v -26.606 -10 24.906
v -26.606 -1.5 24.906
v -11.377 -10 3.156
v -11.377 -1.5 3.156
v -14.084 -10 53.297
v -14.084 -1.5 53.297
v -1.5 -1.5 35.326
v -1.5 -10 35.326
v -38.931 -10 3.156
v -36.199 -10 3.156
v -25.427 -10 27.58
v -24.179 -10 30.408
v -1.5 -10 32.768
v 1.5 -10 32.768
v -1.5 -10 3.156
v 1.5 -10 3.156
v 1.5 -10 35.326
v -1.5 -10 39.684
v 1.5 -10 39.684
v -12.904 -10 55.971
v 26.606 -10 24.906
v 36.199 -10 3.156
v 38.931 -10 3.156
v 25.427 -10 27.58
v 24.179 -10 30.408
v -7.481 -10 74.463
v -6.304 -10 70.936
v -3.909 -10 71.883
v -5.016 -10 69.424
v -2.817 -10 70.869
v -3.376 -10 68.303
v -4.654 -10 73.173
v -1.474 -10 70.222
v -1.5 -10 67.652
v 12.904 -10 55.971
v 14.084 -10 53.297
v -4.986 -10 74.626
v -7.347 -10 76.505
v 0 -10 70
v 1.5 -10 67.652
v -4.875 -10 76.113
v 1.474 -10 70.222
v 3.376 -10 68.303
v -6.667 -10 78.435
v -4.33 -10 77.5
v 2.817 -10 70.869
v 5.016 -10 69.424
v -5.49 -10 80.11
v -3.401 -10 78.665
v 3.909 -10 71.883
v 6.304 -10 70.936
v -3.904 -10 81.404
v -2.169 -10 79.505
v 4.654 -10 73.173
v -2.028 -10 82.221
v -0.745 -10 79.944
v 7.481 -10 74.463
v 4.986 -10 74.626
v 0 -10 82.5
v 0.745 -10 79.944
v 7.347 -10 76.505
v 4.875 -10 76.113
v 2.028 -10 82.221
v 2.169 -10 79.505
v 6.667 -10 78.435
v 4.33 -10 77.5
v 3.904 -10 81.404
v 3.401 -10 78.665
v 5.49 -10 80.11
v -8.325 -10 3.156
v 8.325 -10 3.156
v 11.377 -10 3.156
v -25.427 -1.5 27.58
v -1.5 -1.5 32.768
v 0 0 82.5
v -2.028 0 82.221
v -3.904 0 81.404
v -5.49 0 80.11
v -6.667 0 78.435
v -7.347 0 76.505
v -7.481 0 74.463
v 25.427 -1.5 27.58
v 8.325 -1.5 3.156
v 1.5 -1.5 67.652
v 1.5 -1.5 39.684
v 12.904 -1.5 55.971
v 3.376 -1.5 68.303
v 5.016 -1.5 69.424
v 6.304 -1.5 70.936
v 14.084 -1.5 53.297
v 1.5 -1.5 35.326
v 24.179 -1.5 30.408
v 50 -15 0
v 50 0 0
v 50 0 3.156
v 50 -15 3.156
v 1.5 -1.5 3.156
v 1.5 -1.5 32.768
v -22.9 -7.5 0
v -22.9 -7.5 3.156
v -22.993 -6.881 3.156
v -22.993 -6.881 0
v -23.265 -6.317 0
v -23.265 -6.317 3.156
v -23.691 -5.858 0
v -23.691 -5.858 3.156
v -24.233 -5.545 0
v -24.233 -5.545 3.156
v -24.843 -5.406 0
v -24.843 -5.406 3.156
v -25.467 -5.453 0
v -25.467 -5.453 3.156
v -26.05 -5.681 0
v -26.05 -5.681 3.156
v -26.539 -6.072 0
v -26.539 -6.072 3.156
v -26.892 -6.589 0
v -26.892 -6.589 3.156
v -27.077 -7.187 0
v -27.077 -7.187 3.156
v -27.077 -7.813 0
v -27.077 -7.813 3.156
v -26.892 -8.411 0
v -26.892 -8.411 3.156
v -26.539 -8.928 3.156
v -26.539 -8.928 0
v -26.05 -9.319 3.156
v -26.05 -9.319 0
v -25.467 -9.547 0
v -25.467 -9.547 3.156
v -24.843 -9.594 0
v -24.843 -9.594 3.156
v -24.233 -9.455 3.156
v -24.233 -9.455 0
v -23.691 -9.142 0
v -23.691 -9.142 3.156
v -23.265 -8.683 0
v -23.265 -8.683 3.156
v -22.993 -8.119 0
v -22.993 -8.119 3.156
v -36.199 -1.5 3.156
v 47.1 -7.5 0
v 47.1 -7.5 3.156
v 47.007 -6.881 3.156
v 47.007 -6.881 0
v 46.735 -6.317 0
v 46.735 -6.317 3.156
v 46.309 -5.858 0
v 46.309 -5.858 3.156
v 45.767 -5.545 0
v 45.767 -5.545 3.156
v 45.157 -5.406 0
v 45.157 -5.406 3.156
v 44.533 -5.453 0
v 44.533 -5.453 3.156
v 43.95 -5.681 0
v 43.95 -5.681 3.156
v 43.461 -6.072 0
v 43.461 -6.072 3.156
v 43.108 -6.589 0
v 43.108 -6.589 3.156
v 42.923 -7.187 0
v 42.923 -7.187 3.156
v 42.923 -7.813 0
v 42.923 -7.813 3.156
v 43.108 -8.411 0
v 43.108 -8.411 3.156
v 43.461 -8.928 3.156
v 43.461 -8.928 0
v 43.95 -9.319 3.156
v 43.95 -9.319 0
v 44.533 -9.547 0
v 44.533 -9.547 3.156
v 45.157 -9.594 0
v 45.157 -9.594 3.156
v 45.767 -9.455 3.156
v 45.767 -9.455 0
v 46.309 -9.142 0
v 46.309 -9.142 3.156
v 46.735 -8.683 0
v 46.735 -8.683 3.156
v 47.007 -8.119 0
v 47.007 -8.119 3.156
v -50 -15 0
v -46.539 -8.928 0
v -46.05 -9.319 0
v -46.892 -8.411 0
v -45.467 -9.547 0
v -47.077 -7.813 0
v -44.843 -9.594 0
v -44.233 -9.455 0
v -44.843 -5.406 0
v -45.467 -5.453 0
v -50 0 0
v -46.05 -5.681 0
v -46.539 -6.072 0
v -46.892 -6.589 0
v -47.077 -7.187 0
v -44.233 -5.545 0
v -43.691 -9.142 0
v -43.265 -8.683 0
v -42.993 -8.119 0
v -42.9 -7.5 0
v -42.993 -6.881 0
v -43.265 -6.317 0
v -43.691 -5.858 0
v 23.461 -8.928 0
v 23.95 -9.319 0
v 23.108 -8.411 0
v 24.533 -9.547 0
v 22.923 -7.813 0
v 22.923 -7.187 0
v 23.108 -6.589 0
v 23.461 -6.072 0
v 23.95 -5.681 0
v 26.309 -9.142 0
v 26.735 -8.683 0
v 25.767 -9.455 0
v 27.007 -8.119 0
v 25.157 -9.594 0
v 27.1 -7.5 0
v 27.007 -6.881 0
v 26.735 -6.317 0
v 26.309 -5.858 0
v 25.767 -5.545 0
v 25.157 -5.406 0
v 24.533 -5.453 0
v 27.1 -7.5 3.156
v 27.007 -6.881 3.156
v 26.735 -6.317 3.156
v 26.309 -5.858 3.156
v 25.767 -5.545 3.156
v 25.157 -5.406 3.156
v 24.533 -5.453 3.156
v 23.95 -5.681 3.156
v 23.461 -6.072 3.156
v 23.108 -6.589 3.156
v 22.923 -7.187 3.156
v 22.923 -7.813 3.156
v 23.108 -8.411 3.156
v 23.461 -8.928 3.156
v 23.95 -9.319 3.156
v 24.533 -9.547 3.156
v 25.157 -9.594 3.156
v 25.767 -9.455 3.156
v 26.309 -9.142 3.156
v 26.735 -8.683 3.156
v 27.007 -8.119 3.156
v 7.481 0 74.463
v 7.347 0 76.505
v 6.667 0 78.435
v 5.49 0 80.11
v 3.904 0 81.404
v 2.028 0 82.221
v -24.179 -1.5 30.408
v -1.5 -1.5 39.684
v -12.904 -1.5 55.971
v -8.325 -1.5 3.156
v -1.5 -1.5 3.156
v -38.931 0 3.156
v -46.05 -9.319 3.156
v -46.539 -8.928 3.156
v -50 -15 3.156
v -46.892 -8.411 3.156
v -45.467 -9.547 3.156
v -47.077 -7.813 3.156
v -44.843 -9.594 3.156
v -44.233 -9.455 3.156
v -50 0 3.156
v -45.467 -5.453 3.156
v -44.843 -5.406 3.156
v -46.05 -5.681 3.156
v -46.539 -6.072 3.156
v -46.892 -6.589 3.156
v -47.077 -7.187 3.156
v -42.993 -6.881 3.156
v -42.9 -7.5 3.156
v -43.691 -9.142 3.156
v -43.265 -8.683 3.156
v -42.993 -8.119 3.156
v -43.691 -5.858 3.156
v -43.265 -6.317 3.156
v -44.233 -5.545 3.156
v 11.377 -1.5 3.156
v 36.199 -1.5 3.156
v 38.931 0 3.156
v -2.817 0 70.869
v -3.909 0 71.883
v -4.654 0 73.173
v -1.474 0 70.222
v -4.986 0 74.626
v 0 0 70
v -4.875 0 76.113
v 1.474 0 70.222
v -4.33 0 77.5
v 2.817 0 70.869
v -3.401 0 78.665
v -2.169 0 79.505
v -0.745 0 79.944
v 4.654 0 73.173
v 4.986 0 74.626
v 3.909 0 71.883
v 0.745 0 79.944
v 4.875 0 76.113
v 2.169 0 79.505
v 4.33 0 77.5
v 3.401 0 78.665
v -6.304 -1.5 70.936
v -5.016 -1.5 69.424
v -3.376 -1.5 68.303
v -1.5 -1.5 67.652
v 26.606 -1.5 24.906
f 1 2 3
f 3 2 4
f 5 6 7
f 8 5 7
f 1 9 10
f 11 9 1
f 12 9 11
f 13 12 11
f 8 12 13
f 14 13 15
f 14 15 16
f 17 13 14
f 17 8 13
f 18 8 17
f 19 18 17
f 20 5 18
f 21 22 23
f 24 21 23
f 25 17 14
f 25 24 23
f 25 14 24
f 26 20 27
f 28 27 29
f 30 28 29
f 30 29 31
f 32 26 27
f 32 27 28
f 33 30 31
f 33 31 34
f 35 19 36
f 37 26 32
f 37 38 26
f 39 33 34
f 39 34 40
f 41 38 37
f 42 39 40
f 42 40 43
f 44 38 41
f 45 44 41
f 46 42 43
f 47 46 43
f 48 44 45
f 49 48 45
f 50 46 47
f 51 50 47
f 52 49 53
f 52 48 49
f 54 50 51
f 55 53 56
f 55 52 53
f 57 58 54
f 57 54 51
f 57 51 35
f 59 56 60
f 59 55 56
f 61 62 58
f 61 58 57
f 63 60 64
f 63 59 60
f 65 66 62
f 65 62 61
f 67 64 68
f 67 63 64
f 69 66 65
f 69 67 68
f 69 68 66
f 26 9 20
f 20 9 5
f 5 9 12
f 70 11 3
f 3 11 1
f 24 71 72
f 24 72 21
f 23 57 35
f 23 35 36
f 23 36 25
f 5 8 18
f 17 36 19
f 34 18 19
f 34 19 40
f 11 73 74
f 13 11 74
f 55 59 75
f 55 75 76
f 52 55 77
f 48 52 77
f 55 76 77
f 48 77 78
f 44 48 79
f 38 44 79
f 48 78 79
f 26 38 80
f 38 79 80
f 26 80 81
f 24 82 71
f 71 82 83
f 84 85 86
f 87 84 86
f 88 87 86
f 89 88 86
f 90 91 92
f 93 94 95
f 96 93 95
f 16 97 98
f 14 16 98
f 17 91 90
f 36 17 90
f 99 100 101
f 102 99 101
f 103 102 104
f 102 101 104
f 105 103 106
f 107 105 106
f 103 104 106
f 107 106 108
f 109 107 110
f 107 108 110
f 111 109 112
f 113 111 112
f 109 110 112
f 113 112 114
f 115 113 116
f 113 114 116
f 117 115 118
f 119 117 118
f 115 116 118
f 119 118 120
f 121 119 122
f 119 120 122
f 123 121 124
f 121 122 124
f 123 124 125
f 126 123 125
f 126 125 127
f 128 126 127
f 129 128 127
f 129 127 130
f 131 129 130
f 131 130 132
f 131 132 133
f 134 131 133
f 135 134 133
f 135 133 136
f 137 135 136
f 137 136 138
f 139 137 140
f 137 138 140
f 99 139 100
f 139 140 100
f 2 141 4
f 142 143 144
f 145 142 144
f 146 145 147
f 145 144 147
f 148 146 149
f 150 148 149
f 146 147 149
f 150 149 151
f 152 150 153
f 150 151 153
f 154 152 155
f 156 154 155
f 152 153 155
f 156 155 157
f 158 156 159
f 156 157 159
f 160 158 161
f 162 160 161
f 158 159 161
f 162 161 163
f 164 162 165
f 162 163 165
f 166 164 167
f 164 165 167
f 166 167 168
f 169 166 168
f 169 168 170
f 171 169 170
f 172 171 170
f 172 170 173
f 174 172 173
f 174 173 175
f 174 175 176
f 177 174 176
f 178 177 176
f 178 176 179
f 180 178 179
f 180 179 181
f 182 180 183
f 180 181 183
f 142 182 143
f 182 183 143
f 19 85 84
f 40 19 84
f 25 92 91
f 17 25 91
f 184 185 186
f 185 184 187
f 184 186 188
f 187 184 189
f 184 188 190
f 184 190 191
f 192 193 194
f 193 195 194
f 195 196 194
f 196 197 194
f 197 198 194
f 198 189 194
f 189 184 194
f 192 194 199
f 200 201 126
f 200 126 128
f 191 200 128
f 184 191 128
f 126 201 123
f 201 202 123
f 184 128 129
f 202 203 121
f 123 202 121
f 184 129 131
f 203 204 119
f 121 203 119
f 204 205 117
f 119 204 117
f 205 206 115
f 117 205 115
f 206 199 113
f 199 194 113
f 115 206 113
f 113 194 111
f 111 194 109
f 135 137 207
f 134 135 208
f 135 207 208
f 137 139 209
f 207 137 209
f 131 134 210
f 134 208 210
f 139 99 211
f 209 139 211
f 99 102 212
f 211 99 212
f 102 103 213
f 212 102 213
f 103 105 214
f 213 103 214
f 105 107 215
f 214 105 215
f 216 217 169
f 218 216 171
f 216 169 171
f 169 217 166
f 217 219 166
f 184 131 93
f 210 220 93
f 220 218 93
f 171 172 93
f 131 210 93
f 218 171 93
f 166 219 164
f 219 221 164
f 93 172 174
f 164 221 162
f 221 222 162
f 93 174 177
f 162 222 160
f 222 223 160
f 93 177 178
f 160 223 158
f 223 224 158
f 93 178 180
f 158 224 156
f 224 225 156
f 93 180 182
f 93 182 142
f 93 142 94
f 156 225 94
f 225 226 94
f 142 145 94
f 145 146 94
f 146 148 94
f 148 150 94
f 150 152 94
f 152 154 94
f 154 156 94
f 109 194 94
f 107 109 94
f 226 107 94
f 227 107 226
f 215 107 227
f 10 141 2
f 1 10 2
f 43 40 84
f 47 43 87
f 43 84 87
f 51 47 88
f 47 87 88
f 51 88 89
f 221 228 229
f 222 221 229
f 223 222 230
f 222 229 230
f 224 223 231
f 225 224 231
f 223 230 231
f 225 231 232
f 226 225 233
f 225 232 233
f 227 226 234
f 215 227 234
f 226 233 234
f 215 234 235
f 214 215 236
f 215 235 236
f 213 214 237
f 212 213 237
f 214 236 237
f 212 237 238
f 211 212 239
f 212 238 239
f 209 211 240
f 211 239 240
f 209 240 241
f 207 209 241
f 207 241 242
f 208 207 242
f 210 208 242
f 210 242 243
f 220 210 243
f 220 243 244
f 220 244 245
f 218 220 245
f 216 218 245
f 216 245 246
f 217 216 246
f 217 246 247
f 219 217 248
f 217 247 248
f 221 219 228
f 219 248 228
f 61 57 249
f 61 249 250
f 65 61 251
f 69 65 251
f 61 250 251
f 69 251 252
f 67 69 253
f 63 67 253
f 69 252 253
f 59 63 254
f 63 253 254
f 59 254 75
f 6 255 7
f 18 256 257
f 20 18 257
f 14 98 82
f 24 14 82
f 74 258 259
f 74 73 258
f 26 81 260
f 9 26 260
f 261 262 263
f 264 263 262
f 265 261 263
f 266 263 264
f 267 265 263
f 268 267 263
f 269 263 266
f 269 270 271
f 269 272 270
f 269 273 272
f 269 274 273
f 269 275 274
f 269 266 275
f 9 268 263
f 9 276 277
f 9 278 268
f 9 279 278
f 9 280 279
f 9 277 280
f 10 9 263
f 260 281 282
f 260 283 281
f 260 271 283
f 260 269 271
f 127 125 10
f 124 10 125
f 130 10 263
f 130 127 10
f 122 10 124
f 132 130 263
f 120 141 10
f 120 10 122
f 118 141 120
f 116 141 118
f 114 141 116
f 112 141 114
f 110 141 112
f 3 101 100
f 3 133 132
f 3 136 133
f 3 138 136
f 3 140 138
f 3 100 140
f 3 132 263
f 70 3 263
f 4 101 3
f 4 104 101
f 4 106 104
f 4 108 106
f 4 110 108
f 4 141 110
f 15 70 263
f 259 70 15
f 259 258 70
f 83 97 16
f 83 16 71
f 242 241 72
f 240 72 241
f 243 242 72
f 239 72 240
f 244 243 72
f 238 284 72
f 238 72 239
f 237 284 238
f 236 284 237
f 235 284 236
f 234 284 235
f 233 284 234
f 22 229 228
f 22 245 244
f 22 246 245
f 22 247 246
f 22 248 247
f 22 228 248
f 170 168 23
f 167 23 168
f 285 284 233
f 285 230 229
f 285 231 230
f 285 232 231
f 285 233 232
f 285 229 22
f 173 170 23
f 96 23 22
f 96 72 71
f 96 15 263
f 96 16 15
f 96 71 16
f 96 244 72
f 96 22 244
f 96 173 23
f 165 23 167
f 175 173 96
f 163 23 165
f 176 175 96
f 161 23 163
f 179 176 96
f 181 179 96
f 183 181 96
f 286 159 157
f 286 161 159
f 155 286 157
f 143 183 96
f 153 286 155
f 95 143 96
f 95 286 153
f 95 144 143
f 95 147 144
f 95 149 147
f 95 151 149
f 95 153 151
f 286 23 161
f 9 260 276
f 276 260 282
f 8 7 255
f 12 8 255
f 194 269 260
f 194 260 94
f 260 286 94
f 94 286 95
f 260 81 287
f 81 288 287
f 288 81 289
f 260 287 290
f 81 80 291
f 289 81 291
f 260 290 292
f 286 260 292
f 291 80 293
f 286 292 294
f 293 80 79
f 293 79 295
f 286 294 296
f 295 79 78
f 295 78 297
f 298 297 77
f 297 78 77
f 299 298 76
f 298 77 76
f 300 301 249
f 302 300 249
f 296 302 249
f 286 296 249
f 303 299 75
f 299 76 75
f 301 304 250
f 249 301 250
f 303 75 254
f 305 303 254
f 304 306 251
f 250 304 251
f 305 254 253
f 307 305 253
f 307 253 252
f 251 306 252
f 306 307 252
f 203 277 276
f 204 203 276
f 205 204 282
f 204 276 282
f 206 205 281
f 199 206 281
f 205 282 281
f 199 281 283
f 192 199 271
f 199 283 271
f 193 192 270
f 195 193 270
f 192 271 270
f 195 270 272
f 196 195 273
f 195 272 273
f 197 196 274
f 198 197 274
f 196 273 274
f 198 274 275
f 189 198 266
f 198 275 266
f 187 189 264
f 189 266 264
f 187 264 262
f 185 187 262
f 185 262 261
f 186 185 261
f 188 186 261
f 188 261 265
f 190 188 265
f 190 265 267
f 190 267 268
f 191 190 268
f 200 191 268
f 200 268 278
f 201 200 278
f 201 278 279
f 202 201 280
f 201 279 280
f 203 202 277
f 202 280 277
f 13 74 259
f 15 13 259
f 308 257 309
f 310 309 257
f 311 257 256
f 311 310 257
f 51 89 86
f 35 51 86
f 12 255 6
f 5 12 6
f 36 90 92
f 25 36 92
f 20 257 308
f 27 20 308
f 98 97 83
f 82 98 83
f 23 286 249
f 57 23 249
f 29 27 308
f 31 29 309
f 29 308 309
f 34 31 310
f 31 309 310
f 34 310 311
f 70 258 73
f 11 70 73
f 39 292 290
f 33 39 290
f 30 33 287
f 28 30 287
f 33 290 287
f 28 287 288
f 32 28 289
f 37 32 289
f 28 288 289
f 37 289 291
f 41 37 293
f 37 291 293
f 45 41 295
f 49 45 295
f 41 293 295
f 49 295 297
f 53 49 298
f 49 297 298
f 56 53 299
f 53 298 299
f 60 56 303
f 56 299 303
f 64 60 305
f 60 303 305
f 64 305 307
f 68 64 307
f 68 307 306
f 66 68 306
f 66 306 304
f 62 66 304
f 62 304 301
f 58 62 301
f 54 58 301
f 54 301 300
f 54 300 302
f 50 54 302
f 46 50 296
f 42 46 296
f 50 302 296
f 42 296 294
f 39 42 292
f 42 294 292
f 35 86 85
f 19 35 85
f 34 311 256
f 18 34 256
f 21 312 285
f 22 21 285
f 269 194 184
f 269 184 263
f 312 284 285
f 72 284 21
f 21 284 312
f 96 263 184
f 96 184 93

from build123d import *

# Parameters (mm, degrees)
F1_DEPTH = 10
F3_START = -8.5
F3_DEPTH = 1.5
F4_W     = 100
F4_H     = 3.1556577078
F5_DEPTH = 15
F6_R     = 2.1
F7_DEPTH = 3.1556577078


with BuildPart() as f1:
    # F0 (on Front) → F1 (new body)
    with BuildSketch(Plane.XZ):
        with BuildLine():
            Line((-40, 0), (0, 0))
            Line((0, 0), (40, 0))
            Line((40, 0), (39, 3))
            Line((39, 3), (7.4807440028, 74.4629067455))
            ThreePointArc((7.4807440028, 74.4629067455), (5.4899088977, 80.1098826107), (0, 82.5))
            ThreePointArc((0, 82.5), (-5.4899088977, 80.1098826107), (-7.4807440028, 74.4629067455))
            Line((-7.4807440028, 74.4629067455), (-39, 3))
            Line((-39, 3), (-40, 0))
        make_face()
        Polygon((-36.2676340608, 3), (-26.6060408243, 24.9055150458), (-11.2676340608, 3), align=None, mode=Mode.SUBTRACT)
        Polygon((-8.2156975889, 3), (-25.4265780732, 27.5796846579), (-1.5, 32.7676715966), (-1.5, 3), align=None, mode=Mode.SUBTRACT)
        Polygon((8.2156975889, 3), (1.5, 3), (1.5, 32.7676715966), (25.4265780732, 27.5796846579), align=None, mode=Mode.SUBTRACT)
        Polygon((26.6060408243, 24.9055150458), (36.2676340608, 3), (11.2676340608, 3), align=None, mode=Mode.SUBTRACT)
        Polygon((-14.0836967229, 53.2971467781), (-1.5, 35.3257653858), (-24.1790002431, 30.4082900711), align=None, mode=Mode.SUBTRACT)
        with BuildLine():
            Line((-1.5, 39.6843823749), (-12.9042339719, 55.9713163903))
            Line((-12.9042339719, 55.9713163903), (-6.3037586943, 70.9364269018))
            ThreePointArc((-6.3037586943, 70.9364269018), (-4.2334735249, 68.8090629212), (-1.5, 67.6515307717))
            Line((-1.5, 67.6515307717), (-1.5, 39.6843823749))
        make_face(mode=Mode.SUBTRACT)
        Polygon((1.5, 35.3257653858), (14.0836967229, 53.2971467781), (24.1790002431, 30.4082900711), align=None, mode=Mode.SUBTRACT)
        with BuildLine():
            Line((1.5, 39.6843823749), (1.5, 67.6515307717))
            ThreePointArc((1.5, 67.6515307717), (4.2334735249, 68.8090629212), (6.3037586943, 70.9364269018))
            Line((6.3037586943, 70.9364269018), (12.9042339719, 55.9713163903))
            Line((12.9042339719, 55.9713163903), (1.5, 39.6843823749))
        make_face(mode=Mode.SUBTRACT)
        with BuildLine():
            ThreePointArc((0, 80), (5, 75), (0, 70))
            ThreePointArc((0, 70), (-5, 75), (0, 80))
        make_face(mode=Mode.SUBTRACT)
    extrude(amount=F1_DEPTH)

    # F2 (on face) → F3 (join)
    with BuildSketch(Plane.XZ.offset(10).offset(F3_START)):
        Polygon((-1.5, 67.6515307717), (-7.4807440028, 74.4629067455), (-40, 0), (40, 0), (7.4807440028, 74.4629067455), (1.5, 67.6515307717), align=None)
    extrude(amount=-F3_DEPTH)

    # F4 (on Front) → F5 (join)
    with BuildSketch(Plane.XZ):
        with Locations((0, 1.5778288539)):
            Rectangle(F4_W, F4_H)
    extrude(amount=F5_DEPTH)

    # F6 (on face) → F7 (cut, through all)
    with BuildSketch(Plane.XY.offset(3.1556577078)):
        with Locations((-45, -7.5)):
            Circle(F6_R)
        with Locations((45, -7.5)):
            Circle(F6_R)
        with Locations((-25, -7.5)):
            Circle(F6_R)
        with Locations((25, -7.5)):
            Circle(F6_R)
    extrude(amount=-F7_DEPTH, mode=Mode.SUBTRACT)


solid = f1.part
